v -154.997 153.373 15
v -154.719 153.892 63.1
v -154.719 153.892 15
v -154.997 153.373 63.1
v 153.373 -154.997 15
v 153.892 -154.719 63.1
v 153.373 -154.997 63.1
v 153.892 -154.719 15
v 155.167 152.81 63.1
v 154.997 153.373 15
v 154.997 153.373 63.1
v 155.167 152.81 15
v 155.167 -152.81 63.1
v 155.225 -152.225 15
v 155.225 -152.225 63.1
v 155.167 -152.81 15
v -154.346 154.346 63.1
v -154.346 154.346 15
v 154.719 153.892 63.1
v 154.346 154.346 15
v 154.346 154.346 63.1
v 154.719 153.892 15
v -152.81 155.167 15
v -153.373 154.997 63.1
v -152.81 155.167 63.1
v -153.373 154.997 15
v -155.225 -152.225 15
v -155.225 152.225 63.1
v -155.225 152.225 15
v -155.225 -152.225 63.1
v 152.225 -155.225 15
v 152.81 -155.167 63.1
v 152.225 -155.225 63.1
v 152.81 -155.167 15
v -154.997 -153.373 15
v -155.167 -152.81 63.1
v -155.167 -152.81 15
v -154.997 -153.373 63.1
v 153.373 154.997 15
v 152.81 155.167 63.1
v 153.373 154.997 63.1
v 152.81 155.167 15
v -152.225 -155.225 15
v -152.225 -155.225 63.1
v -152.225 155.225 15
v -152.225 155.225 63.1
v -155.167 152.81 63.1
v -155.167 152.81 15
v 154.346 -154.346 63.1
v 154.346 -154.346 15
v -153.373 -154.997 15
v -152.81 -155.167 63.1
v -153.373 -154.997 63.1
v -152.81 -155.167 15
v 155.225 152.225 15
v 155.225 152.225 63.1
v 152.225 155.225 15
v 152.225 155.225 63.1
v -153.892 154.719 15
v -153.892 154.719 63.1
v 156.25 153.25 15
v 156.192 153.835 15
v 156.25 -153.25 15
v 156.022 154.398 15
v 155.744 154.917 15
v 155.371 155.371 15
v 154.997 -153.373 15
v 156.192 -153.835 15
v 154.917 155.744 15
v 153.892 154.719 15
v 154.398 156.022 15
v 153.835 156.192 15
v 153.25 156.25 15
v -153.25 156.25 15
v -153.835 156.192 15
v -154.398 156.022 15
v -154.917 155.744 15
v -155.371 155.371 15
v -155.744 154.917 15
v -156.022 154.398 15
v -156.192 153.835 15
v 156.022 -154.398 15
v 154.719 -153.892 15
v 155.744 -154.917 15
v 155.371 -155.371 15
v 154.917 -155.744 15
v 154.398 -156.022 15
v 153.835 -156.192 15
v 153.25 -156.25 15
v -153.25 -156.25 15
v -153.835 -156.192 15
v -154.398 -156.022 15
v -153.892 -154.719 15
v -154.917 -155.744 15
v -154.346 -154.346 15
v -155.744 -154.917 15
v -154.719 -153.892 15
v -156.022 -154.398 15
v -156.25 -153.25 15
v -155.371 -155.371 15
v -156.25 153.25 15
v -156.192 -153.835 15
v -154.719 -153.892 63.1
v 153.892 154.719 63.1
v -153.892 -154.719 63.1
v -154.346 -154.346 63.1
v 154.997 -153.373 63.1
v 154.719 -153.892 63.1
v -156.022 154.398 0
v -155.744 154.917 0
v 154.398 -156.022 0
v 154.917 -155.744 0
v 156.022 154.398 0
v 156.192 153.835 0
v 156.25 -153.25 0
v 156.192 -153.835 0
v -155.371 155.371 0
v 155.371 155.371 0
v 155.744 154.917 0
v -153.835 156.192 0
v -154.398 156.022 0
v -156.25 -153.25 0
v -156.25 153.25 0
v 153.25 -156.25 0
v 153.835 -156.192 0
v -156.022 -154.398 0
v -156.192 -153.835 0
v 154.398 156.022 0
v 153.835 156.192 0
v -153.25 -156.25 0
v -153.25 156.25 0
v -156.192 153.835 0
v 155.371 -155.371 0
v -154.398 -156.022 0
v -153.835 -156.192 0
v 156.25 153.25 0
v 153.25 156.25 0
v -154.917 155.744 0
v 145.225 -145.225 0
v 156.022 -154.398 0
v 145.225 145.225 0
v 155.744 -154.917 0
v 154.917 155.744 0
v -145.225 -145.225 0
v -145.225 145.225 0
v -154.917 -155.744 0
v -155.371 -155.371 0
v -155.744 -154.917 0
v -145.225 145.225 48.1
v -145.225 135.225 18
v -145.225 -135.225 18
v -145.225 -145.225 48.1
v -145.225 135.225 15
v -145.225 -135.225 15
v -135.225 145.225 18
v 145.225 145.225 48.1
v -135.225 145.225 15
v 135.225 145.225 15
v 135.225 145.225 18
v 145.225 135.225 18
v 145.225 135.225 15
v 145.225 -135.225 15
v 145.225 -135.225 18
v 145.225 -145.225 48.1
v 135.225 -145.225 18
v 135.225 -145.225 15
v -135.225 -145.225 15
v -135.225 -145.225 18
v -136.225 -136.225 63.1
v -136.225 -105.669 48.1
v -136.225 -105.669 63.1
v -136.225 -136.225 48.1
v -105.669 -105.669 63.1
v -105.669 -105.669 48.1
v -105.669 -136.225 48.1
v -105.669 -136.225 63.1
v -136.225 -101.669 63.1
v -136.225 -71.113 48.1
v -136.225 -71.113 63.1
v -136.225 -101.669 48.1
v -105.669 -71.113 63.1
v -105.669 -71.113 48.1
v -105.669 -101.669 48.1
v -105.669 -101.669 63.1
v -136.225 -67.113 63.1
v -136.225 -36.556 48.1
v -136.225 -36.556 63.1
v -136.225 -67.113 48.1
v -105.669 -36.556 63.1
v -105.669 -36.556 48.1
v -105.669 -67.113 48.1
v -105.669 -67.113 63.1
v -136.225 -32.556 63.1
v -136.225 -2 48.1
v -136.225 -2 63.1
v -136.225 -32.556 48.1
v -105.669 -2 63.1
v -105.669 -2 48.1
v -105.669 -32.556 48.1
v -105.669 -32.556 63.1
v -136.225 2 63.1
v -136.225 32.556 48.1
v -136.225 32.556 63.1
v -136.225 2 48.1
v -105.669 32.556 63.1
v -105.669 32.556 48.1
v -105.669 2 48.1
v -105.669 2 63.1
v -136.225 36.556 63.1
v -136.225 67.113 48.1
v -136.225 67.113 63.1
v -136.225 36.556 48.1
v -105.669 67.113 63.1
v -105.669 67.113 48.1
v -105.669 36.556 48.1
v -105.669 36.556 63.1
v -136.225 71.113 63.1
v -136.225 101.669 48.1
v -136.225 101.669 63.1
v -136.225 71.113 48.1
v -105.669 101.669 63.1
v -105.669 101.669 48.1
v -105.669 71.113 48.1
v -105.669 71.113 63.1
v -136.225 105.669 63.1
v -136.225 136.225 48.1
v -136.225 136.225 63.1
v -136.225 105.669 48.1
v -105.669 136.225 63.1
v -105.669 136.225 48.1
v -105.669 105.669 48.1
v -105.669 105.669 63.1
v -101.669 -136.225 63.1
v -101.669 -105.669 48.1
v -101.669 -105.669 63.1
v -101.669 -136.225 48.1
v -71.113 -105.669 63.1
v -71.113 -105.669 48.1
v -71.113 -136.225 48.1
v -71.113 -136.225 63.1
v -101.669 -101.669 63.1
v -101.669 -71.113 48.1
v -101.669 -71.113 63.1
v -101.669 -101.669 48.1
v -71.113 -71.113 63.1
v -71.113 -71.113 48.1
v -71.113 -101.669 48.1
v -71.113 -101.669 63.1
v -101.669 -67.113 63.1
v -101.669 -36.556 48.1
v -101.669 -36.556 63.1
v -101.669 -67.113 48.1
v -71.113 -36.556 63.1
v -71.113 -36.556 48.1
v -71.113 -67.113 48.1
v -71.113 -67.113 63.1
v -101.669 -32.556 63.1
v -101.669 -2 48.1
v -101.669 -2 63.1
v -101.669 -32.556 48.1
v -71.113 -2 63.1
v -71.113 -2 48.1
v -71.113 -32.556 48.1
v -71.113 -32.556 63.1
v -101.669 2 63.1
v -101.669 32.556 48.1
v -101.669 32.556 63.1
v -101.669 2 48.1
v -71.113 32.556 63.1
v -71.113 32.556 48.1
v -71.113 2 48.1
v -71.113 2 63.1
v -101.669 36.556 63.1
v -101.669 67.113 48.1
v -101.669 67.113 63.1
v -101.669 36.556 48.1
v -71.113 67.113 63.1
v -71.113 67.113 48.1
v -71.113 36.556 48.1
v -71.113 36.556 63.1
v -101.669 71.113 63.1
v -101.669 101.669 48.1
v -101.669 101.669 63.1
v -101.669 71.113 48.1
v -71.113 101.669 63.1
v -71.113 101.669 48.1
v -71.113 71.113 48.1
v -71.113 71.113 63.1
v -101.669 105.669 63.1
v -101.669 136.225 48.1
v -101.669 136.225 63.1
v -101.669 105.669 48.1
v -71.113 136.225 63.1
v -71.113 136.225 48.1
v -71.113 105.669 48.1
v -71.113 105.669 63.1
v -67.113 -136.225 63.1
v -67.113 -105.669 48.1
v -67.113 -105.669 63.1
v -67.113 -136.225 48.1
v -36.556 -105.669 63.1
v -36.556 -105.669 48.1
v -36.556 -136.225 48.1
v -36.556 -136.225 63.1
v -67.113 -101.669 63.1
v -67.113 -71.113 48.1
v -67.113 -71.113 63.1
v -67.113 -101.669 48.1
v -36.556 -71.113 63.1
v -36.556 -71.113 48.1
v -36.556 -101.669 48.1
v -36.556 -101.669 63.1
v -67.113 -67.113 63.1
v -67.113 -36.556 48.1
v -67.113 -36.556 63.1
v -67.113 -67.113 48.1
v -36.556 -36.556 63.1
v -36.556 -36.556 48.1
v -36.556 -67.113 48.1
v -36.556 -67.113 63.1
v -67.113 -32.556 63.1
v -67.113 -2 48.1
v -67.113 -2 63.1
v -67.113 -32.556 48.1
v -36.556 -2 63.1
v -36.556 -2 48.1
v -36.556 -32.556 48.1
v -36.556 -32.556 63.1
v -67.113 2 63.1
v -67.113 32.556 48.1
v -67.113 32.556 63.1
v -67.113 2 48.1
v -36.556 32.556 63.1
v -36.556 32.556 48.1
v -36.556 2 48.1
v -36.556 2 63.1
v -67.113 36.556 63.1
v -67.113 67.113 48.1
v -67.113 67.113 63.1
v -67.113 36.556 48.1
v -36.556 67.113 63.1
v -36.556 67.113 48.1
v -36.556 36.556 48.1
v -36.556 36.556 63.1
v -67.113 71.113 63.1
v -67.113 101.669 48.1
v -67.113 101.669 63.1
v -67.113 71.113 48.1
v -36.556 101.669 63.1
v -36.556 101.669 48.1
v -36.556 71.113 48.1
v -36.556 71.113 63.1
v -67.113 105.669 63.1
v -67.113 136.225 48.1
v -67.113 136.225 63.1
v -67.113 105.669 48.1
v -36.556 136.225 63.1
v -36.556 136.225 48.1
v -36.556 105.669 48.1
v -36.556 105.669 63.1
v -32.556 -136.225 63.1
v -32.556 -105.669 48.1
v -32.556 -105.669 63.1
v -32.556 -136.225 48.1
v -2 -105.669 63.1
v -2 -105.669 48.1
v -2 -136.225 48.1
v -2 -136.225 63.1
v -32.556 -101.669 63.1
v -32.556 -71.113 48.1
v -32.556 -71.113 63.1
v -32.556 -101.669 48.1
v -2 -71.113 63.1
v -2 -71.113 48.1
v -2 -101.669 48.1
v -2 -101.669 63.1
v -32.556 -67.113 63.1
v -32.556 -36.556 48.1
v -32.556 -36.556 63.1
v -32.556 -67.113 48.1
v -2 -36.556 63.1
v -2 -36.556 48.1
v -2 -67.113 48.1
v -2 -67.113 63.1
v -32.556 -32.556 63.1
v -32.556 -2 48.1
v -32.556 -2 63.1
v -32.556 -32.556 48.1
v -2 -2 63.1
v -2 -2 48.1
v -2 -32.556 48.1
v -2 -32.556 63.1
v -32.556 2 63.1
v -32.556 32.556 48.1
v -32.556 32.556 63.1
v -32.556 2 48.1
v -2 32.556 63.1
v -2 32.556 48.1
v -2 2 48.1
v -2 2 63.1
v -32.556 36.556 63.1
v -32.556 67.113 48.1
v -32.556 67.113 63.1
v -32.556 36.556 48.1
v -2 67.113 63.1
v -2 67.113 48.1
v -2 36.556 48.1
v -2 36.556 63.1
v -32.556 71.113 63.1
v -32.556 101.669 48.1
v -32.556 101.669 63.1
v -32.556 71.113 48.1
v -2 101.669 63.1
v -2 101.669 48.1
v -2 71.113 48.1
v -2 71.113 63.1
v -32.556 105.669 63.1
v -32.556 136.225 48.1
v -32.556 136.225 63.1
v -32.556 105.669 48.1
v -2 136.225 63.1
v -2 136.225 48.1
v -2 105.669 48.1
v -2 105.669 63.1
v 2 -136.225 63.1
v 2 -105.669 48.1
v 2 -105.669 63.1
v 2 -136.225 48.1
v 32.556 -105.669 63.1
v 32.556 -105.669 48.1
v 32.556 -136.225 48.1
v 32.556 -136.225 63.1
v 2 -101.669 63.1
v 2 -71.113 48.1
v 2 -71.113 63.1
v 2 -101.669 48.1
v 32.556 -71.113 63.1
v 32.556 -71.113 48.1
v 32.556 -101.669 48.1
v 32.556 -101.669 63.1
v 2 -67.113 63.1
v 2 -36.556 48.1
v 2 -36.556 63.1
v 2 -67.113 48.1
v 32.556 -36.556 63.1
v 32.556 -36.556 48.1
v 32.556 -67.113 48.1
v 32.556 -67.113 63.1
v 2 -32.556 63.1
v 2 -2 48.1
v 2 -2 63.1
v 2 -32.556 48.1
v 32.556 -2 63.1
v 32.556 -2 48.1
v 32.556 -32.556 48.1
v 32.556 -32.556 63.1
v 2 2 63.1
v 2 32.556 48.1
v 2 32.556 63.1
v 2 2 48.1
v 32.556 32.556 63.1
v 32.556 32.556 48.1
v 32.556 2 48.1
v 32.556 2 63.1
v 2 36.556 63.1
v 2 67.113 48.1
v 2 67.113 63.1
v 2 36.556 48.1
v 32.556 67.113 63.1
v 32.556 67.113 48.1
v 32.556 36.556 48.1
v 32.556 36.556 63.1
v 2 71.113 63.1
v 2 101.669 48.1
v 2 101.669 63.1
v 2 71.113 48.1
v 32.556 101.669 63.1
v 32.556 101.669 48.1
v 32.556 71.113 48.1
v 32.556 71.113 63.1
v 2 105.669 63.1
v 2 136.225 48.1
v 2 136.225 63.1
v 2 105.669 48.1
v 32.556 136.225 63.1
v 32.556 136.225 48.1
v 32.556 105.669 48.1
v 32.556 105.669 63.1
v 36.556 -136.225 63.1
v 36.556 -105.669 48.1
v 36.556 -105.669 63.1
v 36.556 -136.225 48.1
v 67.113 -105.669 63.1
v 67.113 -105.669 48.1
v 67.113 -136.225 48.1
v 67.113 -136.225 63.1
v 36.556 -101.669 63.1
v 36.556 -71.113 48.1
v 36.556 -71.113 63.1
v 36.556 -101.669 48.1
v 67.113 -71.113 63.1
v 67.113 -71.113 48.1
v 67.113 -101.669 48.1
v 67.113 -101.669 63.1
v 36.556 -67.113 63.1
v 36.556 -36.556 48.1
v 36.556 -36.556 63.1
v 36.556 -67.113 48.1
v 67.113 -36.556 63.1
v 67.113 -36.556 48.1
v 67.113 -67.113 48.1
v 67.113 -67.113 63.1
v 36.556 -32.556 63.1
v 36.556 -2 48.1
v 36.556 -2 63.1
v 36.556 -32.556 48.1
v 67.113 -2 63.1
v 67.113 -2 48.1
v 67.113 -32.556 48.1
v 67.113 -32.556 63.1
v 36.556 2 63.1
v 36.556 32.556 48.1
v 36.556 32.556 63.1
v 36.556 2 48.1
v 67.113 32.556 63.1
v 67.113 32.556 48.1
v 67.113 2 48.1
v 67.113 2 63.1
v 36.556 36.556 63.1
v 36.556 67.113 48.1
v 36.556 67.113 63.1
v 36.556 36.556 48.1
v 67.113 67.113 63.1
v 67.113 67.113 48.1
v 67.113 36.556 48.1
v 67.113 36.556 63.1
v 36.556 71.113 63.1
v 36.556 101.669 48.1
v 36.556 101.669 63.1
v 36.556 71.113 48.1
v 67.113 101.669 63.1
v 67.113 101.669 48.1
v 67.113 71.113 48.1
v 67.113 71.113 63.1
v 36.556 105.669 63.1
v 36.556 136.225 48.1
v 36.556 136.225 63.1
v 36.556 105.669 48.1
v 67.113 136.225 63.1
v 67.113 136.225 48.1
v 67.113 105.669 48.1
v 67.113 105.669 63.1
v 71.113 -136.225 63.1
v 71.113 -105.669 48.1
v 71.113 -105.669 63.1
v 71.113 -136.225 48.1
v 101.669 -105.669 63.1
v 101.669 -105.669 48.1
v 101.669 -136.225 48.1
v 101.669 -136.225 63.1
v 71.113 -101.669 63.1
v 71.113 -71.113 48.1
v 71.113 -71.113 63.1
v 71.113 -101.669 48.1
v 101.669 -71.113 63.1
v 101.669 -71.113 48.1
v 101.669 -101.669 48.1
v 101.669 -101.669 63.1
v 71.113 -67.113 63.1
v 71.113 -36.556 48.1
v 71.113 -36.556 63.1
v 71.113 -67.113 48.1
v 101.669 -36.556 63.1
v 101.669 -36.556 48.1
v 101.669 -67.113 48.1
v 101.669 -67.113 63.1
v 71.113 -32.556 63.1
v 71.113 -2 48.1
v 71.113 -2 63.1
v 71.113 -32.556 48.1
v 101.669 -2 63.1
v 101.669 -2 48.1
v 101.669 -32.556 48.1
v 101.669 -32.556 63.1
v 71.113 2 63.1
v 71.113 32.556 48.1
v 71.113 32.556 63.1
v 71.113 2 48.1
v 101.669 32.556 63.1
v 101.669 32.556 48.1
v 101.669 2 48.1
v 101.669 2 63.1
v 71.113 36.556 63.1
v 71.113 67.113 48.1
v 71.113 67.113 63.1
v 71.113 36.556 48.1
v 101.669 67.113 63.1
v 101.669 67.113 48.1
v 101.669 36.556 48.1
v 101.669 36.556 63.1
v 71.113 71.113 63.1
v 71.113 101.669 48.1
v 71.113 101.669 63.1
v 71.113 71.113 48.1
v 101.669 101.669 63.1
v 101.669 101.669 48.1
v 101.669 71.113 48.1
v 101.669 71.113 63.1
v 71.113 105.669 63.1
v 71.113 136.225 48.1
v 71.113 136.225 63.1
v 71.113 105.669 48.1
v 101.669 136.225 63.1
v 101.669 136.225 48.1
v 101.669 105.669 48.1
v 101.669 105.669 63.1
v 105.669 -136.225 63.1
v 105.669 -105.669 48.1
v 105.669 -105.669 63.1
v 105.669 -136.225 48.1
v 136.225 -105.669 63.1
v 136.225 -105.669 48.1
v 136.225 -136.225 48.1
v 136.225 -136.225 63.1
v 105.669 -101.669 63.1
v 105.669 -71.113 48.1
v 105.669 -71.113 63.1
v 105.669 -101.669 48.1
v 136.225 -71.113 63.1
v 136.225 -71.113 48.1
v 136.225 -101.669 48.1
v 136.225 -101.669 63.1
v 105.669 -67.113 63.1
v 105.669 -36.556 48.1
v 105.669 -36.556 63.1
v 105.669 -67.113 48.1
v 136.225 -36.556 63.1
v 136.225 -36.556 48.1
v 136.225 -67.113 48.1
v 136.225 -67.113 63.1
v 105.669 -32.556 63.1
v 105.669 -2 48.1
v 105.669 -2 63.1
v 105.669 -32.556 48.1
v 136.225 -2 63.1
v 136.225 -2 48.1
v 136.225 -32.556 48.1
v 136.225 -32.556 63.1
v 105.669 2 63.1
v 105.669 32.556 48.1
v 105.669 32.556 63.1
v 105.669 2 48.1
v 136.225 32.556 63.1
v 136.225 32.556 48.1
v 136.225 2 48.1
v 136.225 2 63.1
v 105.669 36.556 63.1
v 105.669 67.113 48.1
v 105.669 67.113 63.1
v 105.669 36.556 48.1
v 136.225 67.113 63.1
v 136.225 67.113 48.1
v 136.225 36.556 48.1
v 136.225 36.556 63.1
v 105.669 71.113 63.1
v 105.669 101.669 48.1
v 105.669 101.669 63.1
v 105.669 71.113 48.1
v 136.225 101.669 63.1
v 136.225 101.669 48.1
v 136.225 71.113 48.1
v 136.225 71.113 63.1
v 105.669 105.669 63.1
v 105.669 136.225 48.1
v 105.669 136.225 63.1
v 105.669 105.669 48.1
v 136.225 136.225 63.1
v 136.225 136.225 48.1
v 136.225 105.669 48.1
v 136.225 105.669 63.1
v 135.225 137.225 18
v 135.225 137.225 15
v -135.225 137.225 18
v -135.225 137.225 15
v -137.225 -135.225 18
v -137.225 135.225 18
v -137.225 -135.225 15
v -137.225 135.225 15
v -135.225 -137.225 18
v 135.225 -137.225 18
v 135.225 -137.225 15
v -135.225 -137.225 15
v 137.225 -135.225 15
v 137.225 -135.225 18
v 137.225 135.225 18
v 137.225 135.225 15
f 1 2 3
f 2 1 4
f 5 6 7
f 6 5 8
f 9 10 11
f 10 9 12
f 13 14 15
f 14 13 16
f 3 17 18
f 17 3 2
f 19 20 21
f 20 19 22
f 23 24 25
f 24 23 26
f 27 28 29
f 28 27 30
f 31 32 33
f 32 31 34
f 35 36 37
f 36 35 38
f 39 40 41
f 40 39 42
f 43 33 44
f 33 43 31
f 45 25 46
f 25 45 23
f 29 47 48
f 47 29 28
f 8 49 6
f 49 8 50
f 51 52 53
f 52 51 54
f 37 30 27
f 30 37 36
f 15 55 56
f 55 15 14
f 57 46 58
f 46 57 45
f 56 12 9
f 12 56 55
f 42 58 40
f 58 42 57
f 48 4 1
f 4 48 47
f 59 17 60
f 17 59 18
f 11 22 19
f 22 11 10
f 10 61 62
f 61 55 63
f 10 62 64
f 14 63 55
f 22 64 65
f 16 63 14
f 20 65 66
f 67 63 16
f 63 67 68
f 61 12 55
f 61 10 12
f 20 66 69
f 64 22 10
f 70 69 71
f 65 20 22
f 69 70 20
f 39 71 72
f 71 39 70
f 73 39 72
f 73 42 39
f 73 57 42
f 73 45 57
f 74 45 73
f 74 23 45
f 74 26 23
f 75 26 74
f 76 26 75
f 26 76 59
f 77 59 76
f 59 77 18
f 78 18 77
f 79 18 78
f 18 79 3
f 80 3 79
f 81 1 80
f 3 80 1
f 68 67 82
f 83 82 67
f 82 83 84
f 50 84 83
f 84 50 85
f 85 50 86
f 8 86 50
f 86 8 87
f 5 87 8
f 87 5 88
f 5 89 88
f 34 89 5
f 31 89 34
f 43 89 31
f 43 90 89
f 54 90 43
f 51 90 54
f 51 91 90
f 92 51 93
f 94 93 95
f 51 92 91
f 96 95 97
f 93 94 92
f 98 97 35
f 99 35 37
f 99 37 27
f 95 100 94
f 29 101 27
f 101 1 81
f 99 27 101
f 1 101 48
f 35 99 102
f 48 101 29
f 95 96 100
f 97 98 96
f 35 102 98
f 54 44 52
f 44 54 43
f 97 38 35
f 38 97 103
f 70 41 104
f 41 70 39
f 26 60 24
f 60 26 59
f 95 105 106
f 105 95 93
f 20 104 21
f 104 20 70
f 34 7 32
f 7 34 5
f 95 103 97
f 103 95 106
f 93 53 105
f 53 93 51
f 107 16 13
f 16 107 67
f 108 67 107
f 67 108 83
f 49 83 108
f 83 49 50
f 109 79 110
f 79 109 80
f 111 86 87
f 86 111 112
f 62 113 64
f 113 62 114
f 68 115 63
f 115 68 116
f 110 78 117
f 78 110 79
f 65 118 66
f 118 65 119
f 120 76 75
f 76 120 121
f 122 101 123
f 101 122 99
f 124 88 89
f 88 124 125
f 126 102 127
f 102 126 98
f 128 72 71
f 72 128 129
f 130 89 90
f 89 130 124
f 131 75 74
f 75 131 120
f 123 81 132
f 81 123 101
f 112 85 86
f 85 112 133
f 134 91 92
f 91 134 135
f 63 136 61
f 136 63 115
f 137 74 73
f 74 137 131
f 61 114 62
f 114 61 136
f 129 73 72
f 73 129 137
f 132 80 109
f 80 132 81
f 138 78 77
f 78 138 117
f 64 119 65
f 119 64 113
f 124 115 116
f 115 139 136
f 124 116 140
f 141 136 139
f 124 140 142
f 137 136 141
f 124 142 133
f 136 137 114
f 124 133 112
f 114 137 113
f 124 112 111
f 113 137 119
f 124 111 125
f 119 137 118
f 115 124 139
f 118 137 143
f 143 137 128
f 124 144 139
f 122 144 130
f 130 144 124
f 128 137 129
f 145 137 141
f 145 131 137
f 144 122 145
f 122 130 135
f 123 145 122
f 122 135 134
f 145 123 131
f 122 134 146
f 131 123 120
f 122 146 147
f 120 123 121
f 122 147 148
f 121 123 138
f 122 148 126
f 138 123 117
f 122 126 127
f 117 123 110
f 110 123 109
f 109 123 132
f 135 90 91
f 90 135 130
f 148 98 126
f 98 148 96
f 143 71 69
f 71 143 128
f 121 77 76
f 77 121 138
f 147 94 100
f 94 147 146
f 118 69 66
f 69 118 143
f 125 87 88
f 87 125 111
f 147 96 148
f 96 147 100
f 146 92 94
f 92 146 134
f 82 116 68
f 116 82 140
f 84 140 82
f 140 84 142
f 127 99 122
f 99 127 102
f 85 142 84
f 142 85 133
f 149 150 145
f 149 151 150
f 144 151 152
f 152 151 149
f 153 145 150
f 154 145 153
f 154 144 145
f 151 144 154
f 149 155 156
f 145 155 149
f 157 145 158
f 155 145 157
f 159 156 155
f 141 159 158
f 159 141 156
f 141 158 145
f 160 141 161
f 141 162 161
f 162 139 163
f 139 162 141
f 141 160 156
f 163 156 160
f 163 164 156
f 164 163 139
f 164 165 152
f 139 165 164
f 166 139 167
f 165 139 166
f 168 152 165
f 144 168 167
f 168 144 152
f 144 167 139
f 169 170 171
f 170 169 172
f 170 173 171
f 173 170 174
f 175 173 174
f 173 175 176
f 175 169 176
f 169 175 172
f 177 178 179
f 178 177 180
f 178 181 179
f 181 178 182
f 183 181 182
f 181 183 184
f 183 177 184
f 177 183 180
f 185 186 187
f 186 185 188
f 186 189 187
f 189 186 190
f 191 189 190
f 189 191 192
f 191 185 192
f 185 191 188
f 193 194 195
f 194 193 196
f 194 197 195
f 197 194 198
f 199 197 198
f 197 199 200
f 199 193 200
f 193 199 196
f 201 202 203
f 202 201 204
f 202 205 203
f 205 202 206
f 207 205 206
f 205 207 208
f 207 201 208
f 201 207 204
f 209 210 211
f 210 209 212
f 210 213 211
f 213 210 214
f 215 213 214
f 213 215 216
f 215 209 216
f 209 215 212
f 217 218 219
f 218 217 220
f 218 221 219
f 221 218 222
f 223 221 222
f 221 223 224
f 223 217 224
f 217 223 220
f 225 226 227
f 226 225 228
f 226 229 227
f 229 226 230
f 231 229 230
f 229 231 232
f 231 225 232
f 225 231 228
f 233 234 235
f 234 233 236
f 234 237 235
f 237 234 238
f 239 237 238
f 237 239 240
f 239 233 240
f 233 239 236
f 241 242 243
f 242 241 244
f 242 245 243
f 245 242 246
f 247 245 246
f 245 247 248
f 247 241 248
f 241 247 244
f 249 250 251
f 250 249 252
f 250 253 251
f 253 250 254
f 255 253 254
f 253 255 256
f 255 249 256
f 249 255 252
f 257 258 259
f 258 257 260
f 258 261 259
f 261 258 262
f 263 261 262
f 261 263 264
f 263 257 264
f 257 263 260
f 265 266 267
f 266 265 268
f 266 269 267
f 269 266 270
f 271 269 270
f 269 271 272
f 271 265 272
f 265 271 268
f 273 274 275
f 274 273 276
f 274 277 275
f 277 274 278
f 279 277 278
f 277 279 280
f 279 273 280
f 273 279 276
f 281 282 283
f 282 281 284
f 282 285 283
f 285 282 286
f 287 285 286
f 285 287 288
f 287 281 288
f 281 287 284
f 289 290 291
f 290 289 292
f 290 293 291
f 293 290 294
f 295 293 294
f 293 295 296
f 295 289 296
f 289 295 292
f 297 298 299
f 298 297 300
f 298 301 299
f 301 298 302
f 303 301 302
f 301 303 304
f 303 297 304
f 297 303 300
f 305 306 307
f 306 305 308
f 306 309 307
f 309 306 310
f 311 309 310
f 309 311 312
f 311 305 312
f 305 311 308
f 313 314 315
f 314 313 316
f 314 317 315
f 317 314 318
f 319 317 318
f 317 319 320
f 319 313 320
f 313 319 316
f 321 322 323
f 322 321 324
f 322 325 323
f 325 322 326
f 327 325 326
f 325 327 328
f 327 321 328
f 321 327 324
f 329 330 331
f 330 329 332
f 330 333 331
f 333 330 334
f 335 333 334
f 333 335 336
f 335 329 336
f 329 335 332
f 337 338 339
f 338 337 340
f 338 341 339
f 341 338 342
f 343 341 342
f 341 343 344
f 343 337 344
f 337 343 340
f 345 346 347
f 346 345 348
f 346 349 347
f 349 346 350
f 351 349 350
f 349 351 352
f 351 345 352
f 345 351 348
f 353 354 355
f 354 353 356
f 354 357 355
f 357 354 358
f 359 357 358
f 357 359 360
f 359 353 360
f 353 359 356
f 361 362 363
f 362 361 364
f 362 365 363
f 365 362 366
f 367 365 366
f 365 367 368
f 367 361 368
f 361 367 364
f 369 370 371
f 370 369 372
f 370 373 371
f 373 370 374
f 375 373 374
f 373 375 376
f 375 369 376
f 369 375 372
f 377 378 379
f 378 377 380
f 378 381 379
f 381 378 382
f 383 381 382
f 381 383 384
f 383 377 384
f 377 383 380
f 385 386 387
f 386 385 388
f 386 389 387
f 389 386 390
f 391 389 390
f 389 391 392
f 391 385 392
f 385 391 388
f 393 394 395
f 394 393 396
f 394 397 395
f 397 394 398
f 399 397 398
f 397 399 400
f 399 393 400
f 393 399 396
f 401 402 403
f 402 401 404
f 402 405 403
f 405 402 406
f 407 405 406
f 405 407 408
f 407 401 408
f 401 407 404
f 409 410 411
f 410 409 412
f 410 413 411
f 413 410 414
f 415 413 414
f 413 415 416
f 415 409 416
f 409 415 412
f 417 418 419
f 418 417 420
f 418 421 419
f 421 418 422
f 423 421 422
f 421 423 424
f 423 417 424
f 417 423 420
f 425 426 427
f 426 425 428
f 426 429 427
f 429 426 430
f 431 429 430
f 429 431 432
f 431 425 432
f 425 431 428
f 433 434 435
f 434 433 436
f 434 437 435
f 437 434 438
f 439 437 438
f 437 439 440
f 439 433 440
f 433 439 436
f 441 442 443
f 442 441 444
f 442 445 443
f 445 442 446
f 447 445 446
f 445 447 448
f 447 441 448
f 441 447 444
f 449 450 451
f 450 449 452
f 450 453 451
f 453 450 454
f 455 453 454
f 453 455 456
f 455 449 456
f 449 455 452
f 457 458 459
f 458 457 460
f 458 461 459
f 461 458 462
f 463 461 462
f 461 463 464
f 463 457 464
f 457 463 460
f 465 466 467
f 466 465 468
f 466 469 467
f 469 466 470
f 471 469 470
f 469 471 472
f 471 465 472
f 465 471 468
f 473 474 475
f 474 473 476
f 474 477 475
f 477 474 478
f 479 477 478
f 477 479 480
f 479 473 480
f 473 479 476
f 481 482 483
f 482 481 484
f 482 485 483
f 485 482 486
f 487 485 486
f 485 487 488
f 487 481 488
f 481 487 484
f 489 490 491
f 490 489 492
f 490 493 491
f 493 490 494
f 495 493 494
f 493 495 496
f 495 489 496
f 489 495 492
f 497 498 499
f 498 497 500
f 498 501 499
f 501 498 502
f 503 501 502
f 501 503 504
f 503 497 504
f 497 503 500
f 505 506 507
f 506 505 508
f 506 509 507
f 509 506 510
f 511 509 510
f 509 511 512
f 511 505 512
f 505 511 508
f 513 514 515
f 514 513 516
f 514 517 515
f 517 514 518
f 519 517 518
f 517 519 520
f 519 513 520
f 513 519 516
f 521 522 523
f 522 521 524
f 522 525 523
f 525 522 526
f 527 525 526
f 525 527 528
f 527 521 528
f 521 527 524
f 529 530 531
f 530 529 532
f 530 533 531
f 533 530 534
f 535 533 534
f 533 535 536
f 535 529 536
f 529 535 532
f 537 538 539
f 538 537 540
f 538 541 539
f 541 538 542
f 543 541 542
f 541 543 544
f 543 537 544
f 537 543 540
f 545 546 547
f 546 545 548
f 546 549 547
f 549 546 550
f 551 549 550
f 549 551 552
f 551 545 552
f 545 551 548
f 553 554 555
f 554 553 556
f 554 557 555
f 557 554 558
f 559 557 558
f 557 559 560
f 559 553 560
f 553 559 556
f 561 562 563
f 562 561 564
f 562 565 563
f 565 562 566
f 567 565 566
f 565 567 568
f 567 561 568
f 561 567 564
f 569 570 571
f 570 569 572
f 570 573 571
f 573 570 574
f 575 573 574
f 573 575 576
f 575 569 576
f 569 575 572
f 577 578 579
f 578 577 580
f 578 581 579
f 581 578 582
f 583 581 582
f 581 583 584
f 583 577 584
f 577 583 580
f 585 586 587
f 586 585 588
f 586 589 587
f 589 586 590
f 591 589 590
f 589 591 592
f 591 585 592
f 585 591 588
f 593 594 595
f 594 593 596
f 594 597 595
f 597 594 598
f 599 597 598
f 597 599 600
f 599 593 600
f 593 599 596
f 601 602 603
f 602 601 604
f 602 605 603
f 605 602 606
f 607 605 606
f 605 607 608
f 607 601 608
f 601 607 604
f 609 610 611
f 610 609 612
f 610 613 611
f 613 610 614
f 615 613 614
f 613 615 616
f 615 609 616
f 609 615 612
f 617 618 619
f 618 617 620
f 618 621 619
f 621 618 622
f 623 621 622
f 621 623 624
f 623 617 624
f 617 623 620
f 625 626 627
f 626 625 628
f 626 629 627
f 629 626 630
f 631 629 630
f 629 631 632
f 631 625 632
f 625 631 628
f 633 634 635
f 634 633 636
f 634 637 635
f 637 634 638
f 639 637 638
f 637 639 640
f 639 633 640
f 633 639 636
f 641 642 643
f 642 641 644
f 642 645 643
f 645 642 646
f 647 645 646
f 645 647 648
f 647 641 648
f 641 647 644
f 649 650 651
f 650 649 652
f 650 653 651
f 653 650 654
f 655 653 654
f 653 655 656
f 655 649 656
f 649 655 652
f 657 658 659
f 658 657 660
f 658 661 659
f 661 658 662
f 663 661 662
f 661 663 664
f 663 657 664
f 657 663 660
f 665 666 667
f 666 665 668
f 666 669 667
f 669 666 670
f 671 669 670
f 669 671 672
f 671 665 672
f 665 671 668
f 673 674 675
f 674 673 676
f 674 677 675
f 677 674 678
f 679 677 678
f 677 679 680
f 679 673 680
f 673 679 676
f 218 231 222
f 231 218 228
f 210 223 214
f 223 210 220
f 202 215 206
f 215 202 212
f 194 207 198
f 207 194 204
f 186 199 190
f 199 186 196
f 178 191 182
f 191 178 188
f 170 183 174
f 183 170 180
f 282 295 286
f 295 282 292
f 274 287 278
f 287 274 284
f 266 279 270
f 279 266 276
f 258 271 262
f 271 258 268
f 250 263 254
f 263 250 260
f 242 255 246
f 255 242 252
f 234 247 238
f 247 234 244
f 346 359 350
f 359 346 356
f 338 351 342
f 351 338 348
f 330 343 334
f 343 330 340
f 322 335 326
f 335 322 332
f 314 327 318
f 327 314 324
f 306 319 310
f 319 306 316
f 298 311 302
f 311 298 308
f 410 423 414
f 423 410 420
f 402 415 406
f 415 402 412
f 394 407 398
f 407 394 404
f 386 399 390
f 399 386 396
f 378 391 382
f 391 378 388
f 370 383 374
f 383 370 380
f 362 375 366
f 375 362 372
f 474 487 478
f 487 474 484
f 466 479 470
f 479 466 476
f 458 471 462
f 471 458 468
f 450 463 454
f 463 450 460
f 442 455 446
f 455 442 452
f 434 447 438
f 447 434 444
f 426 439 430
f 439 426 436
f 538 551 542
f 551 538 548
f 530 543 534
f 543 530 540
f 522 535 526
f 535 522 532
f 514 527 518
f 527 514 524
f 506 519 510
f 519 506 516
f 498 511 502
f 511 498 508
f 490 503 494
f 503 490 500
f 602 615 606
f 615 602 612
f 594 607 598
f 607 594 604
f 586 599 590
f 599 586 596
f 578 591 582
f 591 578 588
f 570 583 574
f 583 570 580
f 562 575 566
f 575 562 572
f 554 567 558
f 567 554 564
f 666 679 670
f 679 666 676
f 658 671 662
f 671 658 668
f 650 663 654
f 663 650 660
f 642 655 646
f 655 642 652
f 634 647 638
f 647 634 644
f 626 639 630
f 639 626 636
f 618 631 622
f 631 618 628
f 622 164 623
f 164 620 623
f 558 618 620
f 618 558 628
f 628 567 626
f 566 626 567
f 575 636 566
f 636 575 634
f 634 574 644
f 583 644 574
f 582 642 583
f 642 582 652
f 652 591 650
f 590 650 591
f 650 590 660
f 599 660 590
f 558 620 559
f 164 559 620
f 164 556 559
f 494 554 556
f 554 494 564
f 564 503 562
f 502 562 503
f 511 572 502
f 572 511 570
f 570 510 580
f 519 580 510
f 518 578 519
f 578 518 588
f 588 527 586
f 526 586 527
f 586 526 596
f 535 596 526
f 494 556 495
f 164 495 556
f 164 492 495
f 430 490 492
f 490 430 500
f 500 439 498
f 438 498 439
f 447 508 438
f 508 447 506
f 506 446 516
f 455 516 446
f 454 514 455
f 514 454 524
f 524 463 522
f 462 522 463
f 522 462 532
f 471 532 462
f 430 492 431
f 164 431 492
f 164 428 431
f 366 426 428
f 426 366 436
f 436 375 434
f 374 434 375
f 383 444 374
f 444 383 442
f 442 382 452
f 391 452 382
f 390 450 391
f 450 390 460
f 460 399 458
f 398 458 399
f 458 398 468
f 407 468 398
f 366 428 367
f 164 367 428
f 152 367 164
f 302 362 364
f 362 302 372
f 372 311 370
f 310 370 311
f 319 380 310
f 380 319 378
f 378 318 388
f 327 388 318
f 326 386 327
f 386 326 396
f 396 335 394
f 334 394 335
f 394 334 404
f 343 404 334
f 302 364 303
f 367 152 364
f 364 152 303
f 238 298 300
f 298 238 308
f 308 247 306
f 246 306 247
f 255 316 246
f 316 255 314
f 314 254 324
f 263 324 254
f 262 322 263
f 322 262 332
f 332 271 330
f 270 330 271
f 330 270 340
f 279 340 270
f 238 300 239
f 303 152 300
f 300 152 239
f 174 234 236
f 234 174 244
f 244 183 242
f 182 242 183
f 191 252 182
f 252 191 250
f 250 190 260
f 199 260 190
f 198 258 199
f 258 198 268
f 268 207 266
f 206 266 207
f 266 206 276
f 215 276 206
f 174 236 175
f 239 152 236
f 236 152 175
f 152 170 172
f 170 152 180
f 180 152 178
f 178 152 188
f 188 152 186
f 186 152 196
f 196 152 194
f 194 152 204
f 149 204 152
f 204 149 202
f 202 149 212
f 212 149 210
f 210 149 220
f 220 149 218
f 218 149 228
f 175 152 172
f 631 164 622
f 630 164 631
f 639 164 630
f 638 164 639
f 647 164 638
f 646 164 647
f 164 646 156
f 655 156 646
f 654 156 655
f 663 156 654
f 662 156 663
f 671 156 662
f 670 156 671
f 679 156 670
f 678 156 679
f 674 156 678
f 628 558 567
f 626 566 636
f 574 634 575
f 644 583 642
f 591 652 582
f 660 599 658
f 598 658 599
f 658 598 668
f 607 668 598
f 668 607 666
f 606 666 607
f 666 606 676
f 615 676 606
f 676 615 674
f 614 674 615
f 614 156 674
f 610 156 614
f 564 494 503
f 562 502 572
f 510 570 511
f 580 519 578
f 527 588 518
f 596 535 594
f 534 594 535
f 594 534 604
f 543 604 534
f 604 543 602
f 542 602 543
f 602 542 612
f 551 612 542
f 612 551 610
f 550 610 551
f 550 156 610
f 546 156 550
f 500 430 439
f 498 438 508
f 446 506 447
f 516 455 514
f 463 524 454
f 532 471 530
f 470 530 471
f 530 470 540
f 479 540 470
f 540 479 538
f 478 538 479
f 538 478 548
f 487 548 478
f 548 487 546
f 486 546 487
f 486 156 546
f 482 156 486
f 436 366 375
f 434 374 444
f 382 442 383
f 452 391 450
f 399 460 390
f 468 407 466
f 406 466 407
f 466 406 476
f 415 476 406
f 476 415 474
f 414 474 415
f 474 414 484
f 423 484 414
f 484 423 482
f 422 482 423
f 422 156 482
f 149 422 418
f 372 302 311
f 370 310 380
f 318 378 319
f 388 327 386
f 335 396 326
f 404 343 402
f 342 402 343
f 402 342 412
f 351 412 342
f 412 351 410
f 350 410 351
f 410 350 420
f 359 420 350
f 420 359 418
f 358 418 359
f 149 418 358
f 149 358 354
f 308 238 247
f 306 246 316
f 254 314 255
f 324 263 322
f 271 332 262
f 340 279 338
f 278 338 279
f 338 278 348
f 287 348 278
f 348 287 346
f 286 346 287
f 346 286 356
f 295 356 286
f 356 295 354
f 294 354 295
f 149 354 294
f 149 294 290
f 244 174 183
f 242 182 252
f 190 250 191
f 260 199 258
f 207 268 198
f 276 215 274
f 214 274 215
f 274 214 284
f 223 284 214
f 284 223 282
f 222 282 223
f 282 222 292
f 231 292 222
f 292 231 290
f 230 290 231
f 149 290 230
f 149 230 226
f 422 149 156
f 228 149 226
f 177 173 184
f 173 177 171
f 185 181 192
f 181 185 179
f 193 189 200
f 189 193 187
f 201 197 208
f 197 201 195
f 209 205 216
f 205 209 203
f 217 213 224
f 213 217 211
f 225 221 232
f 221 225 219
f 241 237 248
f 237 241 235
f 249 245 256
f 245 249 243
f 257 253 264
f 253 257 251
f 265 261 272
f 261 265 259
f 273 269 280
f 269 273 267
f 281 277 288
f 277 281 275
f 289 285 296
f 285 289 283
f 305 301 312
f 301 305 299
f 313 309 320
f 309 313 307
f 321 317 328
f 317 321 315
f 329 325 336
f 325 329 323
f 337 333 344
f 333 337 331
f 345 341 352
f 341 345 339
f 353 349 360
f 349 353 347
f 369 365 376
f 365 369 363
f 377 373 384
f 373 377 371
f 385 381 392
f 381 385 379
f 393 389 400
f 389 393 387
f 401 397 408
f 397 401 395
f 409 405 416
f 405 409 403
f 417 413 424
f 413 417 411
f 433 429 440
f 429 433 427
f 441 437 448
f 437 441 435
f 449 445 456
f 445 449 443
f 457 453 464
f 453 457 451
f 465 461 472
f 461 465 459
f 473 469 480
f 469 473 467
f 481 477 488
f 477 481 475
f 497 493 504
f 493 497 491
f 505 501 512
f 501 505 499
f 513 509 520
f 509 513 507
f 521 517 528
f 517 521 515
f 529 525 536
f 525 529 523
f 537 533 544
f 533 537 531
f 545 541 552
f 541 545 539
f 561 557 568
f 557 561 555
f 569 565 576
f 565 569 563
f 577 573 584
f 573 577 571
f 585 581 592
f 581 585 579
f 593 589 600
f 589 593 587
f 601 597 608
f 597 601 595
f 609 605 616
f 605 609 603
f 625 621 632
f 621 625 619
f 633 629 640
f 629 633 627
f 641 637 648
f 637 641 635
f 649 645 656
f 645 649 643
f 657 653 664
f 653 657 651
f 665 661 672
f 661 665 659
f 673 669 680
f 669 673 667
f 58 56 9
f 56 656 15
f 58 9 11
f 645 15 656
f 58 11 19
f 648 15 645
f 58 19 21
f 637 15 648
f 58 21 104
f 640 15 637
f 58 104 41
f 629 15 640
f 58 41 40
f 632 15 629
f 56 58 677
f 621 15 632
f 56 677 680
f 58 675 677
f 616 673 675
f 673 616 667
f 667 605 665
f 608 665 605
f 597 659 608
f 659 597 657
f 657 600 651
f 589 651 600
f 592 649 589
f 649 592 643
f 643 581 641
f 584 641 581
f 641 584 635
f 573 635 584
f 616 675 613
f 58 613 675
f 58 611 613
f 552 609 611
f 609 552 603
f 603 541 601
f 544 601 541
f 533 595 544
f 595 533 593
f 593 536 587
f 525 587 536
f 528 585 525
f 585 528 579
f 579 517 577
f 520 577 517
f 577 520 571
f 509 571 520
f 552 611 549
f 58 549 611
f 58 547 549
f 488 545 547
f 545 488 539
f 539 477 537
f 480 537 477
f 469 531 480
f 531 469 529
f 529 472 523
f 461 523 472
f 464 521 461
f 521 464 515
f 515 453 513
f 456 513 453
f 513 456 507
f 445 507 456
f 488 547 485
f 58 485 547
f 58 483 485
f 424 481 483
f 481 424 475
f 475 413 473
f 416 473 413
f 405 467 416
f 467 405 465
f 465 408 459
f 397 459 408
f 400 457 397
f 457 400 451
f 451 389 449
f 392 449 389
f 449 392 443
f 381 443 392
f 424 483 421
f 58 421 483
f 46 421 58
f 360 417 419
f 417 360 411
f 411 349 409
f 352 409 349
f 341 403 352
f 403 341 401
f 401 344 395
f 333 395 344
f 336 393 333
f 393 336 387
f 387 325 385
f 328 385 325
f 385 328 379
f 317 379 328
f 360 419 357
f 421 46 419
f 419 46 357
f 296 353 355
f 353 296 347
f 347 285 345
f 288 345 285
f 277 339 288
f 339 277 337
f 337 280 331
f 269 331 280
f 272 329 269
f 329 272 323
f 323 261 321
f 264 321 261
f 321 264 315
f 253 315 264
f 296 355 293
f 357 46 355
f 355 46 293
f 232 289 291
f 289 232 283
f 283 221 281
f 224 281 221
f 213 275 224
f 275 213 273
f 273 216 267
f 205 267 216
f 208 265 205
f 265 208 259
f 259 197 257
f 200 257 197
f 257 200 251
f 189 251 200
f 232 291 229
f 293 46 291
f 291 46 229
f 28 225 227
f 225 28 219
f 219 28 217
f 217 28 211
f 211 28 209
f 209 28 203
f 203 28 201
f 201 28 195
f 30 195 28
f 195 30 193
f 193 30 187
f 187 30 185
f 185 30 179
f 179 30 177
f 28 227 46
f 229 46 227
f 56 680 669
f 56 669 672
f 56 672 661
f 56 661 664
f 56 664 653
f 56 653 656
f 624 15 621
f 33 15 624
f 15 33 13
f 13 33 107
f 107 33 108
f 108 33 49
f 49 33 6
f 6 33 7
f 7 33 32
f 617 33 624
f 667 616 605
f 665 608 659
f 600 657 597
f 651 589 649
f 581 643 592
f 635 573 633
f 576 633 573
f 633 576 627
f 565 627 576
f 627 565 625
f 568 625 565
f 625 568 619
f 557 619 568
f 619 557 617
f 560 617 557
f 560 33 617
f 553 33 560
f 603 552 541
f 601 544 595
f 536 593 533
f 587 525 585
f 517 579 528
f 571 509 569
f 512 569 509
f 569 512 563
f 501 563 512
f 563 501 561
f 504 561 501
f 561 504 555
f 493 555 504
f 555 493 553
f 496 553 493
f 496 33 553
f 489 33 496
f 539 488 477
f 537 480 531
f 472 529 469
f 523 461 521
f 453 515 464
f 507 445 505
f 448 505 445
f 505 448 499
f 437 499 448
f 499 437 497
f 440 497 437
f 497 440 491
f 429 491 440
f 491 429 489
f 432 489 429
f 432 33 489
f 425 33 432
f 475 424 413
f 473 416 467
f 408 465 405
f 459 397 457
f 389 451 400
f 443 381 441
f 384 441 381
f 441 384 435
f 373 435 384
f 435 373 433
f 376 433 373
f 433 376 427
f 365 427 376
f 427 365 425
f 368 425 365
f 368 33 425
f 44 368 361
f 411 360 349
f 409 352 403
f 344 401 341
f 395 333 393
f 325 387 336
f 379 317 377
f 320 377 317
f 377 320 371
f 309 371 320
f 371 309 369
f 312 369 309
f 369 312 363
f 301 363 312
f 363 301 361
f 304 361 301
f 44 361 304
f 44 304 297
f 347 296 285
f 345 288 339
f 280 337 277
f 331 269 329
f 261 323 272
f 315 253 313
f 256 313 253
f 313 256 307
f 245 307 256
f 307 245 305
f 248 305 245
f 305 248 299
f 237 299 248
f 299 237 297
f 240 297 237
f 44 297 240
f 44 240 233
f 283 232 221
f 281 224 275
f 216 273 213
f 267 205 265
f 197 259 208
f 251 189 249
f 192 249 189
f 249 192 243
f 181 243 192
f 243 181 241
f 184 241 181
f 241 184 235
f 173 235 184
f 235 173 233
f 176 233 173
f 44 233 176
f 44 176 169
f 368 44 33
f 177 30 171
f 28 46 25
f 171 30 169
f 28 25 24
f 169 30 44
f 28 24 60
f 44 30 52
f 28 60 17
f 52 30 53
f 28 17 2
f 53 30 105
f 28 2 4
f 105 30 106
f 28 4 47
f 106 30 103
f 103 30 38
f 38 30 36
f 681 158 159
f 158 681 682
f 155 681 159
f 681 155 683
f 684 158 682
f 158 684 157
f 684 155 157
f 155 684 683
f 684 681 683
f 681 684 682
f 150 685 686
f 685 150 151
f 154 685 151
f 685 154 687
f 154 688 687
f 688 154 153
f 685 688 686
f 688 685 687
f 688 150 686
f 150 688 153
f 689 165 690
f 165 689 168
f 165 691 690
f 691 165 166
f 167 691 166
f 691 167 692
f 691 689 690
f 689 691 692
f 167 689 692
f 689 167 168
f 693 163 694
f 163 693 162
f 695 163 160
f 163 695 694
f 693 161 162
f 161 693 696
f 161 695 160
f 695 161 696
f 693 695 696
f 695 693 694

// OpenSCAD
// Film Dryer Filter Cap
// Holds 2x 12x12x1 furnace filters (11.75" x 11.75" x 0.75" actual)
// Filters slide in from the top, rest on support ledges
// Open top with protective grid for air intake
// Interior cutout goes all the way through
// Designed to fit Bambu Labs H2D (max 350x320x325mm)

/* [Filter Specifications] */
// Actual filter size: 11.75" x 11.75" x 0.75"
filter_width = 298.45; // mm
filter_depth = 298.45; // mm
filter_height = 19.05; // mm (0.75 inches)
num_filters = 2; // stacked vertically
filter_clearance = 2; // mm - gap around filters for easy insertion

/* [Frame Dimensions] */
wall_thickness = 5; // mm
frame_height = 15; // mm - height of top frame/grid

/* [Grid Specifications] */
grid_bar_width = 4; // mm - thinner bars
grid_holes_x = 8; // number of holes in X direction
grid_holes_y = 8; // number of holes in Y direction

/* [Base Interface] */
// Must match fan_base.scad
base_width = 310; // mm
lip_height = 10; // mm
lip_thickness = 4; // mm
interface_gap = 0.5; // mm - clearance for fit

/* [Calculated] */
interior_width = filter_width + filter_clearance;
interior_depth = filter_depth + filter_clearance;
total_filter_height = (filter_height * num_filters) + filter_clearance;

exterior_width = interior_width + (2 * wall_thickness);
exterior_depth = interior_depth + (2 * wall_thickness);
cap_height = total_filter_height + 3 + 5; // ledge + space above filters

// Interface skirt dimensions (fits over fan base lip)
skirt_interior = base_width - (2 * lip_thickness) + interface_gap;
skirt_height = lip_height + 5;
skirt_wall = wall_thickness;
skirt_outer = skirt_interior + (2 * skirt_wall);

// Total height of entire object
total_height = cap_height + skirt_height;

$fn = 32;

// Main body - outer walls with interior cutout going all the way through
module main_body() {
    difference() {
        union() {
            // Main cap body
            translate([0, 0, skirt_height])
                linear_extrude(cap_height)
                    offset(r = 3) offset(r = -3)
                        square([exterior_width, exterior_depth], center = true);

            // Skirt at bottom
            linear_extrude(skirt_height)
                offset(r = 3) offset(r = -3)
                    square([skirt_outer, skirt_outer], center = true);
        }

        // Interior cutout - goes ALL THE WAY through from bottom to top
        translate([0, 0, -1])
            linear_extrude(total_height + 2)
                square([interior_width - 10, interior_depth - 10], center = true);
    }
}

// Top grid with many smaller holes
module top_grid() {
    grid_z = skirt_height + cap_height - frame_height;

    // Calculate hole sizes based on count
    usable_width = interior_width - 20; // Leave margin
    usable_depth = interior_depth - 20;

    hole_width = (usable_width - (grid_holes_x + 1) * grid_bar_width) / grid_holes_x;
    hole_depth = (usable_depth - (grid_holes_y + 1) * grid_bar_width) / grid_holes_y;

    translate([0, 0, grid_z]) {
        difference() {
            // Solid top frame
            linear_extrude(frame_height)
                offset(r = 3) offset(r = -3)
                    square([exterior_width, exterior_depth], center = true);

            // Cut grid holes
            start_x = -usable_width/2 + grid_bar_width + hole_width/2;
            start_y = -usable_depth/2 + grid_bar_width + hole_depth/2;
            step_x = hole_width + grid_bar_width;
            step_y = hole_depth + grid_bar_width;

            for (ix = [0:grid_holes_x-1]) {
                for (iy = [0:grid_holes_y-1]) {
                    translate([start_x + ix * step_x, start_y + iy * step_y, -1])
                        linear_extrude(frame_height + 2)
                            square([hole_width, hole_depth], center = true);
                }
            }
        }
    }
}

// Filter support ledges
module filter_ledges() {
    ledge_width = 8;
    ledge_thickness = 3;
    ledge_length = interior_width - 30;
    ledge_z = skirt_height + ledge_thickness/2;

    // Four ledges around perimeter
    for (angle = [0, 90, 180, 270]) {
        rotate([0, 0, angle])
            translate([0, interior_depth/2 - ledge_width/2 - 5, ledge_z])
                cube([ledge_length, ledge_width, ledge_thickness], center = true);
    }
}

// Complete filter cap
module filter_cap() {
    union() {
        main_body();
        top_grid();
        filter_ledges();
    }
}

// Render
filter_cap();

// Debug output
echo("=== FILTER CAP DIMENSIONS ===");
echo(str("Exterior: ", exterior_width, " x ", exterior_depth, " mm"));
echo(str("Interior cutout: ", interior_width - 10, " x ", interior_depth - 10, " mm (through entire height)"));
echo(str("Cap height: ", cap_height, " mm"));
echo(str("Skirt height: ", skirt_height, " mm"));
echo(str("Total height: ", total_height, " mm"));
echo(str("Grid: ", grid_holes_x, " x ", grid_holes_y, " holes"));
echo("");
echo("=== BUILD CHECK (H2D: 350x320x325) ===");
echo(str("Width: ", exterior_width, " / 350 mm - ", exterior_width <= 350 ? "OK" : "TOO BIG"));
echo(str("Depth: ", exterior_depth, " / 320 mm - ", exterior_depth <= 320 ? "OK" : "TOO BIG"));
echo(str("Height: ", total_height, " / 325 mm - ", total_height <= 325 ? "OK" : "TOO BIG"));
